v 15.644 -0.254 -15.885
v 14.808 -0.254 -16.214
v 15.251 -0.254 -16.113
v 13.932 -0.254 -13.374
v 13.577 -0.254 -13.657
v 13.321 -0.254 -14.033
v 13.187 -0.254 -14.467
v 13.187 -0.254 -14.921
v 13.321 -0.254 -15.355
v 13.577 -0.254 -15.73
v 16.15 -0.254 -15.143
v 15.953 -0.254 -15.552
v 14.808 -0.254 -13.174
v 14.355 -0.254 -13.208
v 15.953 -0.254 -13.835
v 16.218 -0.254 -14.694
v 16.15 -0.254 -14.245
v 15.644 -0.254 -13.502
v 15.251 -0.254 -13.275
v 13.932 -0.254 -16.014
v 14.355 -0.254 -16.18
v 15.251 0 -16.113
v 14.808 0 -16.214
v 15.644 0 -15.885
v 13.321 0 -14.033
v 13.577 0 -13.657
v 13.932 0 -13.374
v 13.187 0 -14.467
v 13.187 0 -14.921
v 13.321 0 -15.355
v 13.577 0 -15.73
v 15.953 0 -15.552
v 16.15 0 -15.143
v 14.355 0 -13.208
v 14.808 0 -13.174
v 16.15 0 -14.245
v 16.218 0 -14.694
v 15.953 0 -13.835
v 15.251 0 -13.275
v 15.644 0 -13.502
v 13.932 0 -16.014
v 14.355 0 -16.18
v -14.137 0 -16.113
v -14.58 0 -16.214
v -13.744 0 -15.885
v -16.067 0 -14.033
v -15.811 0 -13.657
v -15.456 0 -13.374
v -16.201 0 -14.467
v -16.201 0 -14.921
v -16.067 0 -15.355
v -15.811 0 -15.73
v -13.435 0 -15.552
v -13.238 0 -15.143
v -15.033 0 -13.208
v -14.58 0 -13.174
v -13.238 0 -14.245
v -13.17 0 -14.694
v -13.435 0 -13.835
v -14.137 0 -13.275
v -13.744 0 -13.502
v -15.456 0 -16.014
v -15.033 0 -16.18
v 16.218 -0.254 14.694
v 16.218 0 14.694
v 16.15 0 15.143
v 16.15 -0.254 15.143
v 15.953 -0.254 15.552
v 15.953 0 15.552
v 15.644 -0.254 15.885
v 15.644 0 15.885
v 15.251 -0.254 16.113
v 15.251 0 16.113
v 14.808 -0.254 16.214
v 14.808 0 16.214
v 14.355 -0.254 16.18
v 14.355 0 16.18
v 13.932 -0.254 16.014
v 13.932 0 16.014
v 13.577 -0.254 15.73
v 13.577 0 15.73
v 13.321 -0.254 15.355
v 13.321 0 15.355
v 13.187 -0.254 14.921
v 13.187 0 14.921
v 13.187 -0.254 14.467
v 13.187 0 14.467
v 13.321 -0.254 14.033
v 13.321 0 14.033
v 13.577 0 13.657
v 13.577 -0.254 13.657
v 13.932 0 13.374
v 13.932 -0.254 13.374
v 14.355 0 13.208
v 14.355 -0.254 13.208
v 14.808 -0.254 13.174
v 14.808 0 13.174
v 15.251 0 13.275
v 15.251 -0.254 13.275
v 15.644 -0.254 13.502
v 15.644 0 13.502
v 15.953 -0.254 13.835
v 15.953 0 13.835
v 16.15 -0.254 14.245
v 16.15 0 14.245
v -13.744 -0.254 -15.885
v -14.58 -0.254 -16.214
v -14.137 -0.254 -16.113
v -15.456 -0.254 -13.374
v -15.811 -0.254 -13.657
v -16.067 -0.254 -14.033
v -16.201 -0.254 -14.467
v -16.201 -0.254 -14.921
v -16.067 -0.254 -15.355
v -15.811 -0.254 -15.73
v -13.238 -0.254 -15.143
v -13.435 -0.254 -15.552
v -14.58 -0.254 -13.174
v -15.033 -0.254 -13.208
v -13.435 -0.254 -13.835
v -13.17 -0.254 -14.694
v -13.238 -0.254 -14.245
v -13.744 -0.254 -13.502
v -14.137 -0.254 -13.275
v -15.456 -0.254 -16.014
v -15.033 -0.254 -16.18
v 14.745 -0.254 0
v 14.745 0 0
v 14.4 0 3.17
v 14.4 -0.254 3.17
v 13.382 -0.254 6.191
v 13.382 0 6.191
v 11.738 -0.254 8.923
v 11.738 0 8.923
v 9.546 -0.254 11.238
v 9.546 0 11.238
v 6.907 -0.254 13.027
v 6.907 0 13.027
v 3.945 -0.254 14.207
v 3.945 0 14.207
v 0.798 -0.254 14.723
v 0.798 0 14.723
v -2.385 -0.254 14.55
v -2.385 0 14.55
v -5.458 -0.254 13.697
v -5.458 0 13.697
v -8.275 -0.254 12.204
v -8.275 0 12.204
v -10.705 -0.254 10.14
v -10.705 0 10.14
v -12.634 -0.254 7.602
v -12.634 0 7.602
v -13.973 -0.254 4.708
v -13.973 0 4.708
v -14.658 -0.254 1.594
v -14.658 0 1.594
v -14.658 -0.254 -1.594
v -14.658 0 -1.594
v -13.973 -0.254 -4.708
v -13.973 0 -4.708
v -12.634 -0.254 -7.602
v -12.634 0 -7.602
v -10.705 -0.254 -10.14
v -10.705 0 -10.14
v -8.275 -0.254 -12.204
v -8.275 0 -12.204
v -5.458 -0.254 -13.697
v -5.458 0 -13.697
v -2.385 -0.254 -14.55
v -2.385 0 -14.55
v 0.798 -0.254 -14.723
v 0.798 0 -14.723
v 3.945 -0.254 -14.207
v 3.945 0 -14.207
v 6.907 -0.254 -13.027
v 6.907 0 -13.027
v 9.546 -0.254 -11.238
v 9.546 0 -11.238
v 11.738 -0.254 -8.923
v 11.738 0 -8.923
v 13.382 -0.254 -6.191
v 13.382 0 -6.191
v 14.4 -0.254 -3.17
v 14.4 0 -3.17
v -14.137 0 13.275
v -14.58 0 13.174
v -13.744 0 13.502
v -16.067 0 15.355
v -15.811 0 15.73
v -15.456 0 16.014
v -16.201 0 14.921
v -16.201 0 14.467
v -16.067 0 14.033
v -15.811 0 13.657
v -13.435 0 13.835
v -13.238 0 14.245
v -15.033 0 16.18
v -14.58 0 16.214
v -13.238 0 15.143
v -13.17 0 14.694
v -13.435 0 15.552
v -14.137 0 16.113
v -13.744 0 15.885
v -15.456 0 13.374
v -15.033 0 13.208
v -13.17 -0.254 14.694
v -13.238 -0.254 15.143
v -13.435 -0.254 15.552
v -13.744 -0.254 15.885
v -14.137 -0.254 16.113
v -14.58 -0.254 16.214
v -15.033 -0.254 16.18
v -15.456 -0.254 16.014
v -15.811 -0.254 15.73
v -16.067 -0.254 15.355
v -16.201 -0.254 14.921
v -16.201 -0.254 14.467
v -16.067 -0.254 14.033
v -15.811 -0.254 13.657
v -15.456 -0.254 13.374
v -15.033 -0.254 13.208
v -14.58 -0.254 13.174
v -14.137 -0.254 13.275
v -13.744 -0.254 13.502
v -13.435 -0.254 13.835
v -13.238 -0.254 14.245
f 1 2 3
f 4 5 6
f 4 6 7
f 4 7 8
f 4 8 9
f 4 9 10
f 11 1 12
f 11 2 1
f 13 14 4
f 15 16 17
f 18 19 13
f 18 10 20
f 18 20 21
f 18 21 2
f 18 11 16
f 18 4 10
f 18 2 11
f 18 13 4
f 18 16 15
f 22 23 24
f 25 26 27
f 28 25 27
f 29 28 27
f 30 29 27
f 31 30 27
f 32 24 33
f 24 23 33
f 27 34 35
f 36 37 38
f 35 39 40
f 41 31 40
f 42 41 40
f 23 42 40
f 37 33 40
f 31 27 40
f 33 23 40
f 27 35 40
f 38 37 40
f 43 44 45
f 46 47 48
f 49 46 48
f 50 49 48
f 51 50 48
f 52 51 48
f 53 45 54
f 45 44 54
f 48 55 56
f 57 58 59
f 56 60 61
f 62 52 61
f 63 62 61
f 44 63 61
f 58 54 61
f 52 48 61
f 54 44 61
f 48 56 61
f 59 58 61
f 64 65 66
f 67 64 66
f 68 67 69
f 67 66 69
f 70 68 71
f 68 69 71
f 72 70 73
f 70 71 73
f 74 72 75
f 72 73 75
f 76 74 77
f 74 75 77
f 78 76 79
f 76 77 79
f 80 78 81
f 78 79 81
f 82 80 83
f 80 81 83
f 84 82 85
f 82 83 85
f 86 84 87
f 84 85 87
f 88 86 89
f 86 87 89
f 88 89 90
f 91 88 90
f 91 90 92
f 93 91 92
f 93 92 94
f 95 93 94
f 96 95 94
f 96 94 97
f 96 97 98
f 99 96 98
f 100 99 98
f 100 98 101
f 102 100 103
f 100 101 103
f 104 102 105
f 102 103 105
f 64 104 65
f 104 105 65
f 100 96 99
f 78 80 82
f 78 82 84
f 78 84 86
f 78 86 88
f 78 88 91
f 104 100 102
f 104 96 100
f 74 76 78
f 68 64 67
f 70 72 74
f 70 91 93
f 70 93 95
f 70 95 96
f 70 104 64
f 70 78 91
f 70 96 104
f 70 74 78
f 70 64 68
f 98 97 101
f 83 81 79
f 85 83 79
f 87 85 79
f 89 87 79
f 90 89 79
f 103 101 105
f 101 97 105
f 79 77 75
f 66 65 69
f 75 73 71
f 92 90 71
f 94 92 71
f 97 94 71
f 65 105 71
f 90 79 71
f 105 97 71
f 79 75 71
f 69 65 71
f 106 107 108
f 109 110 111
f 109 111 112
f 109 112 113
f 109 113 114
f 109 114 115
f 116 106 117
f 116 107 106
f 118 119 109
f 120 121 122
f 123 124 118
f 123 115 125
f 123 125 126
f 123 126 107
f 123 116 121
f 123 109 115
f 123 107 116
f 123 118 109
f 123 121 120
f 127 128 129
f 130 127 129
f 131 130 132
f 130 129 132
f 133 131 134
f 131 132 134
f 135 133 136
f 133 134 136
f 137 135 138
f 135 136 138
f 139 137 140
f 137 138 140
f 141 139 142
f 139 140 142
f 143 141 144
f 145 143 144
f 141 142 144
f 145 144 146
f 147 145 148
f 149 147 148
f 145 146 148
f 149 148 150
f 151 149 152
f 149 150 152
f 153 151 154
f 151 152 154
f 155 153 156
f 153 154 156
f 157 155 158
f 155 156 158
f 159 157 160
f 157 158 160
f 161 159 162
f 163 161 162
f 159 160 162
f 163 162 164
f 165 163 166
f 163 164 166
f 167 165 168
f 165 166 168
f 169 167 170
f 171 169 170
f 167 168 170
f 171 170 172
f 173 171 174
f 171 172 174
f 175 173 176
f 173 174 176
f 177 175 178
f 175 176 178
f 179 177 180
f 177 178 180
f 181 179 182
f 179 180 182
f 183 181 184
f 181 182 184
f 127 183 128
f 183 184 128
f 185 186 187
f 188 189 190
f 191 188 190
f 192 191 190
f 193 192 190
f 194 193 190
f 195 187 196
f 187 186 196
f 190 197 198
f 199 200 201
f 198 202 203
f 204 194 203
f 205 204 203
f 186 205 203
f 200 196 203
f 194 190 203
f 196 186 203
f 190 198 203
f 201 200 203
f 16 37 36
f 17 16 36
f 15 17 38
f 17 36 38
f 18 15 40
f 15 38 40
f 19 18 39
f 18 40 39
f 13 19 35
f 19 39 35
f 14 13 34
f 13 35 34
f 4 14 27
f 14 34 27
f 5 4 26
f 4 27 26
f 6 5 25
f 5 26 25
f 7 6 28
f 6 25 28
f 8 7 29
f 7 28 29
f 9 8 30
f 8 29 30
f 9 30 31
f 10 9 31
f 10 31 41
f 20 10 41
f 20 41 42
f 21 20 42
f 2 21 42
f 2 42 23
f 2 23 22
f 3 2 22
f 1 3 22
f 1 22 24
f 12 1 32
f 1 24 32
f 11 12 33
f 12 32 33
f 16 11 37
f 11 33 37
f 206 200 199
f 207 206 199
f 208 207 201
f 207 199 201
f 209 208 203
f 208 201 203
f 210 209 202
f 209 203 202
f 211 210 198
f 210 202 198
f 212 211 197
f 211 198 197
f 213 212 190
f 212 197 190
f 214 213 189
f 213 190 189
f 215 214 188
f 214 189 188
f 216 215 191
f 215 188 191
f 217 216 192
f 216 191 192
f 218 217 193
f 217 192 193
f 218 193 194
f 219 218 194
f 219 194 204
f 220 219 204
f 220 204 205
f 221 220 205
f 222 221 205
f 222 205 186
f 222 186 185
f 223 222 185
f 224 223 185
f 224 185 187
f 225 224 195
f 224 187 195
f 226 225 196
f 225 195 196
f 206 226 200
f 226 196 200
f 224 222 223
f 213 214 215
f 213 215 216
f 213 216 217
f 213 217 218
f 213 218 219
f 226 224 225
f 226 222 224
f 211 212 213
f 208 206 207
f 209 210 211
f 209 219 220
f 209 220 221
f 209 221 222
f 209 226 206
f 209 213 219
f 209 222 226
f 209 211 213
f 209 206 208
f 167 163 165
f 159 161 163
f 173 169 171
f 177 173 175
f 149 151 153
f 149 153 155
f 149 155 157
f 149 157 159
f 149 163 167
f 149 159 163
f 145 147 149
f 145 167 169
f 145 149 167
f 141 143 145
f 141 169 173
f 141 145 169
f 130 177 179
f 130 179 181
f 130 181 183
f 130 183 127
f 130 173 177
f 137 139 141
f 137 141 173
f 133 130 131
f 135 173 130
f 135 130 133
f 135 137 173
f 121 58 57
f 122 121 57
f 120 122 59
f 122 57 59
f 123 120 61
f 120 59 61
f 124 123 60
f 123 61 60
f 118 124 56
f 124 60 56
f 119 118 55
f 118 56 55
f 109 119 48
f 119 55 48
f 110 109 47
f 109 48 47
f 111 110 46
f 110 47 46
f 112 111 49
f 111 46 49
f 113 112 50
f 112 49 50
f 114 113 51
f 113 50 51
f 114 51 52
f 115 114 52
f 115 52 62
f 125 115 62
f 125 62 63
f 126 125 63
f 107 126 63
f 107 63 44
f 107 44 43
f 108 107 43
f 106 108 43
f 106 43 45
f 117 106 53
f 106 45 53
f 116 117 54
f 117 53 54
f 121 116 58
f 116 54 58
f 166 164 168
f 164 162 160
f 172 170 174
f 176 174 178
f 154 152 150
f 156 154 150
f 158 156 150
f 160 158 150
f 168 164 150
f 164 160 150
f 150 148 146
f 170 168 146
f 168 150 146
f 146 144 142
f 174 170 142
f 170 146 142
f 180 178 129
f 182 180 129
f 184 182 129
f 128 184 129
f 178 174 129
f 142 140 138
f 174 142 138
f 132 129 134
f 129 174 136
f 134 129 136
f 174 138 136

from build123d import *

# Parameters (mm, degrees)
F0_R     = 14.7447
F0_R_2   = 1.524
F1_DEPTH = 0.254


with BuildPart() as f1:
    # F0 (on Front) → F1 (new body)
    with BuildSketch(Plane.XZ):
        Circle(F0_R)
        with Locations((-14.6939, 14.6939)):
            Circle(F0_R_2)
        with Locations((14.6939, 14.6939)):
            Circle(F0_R_2)
        with Locations((14.6939, -14.6939)):
            Circle(F0_R_2)
        with Locations((-14.6939, -14.6939)):
            Circle(F0_R_2)
    extrude(amount=F1_DEPTH)


solid = f1.part
